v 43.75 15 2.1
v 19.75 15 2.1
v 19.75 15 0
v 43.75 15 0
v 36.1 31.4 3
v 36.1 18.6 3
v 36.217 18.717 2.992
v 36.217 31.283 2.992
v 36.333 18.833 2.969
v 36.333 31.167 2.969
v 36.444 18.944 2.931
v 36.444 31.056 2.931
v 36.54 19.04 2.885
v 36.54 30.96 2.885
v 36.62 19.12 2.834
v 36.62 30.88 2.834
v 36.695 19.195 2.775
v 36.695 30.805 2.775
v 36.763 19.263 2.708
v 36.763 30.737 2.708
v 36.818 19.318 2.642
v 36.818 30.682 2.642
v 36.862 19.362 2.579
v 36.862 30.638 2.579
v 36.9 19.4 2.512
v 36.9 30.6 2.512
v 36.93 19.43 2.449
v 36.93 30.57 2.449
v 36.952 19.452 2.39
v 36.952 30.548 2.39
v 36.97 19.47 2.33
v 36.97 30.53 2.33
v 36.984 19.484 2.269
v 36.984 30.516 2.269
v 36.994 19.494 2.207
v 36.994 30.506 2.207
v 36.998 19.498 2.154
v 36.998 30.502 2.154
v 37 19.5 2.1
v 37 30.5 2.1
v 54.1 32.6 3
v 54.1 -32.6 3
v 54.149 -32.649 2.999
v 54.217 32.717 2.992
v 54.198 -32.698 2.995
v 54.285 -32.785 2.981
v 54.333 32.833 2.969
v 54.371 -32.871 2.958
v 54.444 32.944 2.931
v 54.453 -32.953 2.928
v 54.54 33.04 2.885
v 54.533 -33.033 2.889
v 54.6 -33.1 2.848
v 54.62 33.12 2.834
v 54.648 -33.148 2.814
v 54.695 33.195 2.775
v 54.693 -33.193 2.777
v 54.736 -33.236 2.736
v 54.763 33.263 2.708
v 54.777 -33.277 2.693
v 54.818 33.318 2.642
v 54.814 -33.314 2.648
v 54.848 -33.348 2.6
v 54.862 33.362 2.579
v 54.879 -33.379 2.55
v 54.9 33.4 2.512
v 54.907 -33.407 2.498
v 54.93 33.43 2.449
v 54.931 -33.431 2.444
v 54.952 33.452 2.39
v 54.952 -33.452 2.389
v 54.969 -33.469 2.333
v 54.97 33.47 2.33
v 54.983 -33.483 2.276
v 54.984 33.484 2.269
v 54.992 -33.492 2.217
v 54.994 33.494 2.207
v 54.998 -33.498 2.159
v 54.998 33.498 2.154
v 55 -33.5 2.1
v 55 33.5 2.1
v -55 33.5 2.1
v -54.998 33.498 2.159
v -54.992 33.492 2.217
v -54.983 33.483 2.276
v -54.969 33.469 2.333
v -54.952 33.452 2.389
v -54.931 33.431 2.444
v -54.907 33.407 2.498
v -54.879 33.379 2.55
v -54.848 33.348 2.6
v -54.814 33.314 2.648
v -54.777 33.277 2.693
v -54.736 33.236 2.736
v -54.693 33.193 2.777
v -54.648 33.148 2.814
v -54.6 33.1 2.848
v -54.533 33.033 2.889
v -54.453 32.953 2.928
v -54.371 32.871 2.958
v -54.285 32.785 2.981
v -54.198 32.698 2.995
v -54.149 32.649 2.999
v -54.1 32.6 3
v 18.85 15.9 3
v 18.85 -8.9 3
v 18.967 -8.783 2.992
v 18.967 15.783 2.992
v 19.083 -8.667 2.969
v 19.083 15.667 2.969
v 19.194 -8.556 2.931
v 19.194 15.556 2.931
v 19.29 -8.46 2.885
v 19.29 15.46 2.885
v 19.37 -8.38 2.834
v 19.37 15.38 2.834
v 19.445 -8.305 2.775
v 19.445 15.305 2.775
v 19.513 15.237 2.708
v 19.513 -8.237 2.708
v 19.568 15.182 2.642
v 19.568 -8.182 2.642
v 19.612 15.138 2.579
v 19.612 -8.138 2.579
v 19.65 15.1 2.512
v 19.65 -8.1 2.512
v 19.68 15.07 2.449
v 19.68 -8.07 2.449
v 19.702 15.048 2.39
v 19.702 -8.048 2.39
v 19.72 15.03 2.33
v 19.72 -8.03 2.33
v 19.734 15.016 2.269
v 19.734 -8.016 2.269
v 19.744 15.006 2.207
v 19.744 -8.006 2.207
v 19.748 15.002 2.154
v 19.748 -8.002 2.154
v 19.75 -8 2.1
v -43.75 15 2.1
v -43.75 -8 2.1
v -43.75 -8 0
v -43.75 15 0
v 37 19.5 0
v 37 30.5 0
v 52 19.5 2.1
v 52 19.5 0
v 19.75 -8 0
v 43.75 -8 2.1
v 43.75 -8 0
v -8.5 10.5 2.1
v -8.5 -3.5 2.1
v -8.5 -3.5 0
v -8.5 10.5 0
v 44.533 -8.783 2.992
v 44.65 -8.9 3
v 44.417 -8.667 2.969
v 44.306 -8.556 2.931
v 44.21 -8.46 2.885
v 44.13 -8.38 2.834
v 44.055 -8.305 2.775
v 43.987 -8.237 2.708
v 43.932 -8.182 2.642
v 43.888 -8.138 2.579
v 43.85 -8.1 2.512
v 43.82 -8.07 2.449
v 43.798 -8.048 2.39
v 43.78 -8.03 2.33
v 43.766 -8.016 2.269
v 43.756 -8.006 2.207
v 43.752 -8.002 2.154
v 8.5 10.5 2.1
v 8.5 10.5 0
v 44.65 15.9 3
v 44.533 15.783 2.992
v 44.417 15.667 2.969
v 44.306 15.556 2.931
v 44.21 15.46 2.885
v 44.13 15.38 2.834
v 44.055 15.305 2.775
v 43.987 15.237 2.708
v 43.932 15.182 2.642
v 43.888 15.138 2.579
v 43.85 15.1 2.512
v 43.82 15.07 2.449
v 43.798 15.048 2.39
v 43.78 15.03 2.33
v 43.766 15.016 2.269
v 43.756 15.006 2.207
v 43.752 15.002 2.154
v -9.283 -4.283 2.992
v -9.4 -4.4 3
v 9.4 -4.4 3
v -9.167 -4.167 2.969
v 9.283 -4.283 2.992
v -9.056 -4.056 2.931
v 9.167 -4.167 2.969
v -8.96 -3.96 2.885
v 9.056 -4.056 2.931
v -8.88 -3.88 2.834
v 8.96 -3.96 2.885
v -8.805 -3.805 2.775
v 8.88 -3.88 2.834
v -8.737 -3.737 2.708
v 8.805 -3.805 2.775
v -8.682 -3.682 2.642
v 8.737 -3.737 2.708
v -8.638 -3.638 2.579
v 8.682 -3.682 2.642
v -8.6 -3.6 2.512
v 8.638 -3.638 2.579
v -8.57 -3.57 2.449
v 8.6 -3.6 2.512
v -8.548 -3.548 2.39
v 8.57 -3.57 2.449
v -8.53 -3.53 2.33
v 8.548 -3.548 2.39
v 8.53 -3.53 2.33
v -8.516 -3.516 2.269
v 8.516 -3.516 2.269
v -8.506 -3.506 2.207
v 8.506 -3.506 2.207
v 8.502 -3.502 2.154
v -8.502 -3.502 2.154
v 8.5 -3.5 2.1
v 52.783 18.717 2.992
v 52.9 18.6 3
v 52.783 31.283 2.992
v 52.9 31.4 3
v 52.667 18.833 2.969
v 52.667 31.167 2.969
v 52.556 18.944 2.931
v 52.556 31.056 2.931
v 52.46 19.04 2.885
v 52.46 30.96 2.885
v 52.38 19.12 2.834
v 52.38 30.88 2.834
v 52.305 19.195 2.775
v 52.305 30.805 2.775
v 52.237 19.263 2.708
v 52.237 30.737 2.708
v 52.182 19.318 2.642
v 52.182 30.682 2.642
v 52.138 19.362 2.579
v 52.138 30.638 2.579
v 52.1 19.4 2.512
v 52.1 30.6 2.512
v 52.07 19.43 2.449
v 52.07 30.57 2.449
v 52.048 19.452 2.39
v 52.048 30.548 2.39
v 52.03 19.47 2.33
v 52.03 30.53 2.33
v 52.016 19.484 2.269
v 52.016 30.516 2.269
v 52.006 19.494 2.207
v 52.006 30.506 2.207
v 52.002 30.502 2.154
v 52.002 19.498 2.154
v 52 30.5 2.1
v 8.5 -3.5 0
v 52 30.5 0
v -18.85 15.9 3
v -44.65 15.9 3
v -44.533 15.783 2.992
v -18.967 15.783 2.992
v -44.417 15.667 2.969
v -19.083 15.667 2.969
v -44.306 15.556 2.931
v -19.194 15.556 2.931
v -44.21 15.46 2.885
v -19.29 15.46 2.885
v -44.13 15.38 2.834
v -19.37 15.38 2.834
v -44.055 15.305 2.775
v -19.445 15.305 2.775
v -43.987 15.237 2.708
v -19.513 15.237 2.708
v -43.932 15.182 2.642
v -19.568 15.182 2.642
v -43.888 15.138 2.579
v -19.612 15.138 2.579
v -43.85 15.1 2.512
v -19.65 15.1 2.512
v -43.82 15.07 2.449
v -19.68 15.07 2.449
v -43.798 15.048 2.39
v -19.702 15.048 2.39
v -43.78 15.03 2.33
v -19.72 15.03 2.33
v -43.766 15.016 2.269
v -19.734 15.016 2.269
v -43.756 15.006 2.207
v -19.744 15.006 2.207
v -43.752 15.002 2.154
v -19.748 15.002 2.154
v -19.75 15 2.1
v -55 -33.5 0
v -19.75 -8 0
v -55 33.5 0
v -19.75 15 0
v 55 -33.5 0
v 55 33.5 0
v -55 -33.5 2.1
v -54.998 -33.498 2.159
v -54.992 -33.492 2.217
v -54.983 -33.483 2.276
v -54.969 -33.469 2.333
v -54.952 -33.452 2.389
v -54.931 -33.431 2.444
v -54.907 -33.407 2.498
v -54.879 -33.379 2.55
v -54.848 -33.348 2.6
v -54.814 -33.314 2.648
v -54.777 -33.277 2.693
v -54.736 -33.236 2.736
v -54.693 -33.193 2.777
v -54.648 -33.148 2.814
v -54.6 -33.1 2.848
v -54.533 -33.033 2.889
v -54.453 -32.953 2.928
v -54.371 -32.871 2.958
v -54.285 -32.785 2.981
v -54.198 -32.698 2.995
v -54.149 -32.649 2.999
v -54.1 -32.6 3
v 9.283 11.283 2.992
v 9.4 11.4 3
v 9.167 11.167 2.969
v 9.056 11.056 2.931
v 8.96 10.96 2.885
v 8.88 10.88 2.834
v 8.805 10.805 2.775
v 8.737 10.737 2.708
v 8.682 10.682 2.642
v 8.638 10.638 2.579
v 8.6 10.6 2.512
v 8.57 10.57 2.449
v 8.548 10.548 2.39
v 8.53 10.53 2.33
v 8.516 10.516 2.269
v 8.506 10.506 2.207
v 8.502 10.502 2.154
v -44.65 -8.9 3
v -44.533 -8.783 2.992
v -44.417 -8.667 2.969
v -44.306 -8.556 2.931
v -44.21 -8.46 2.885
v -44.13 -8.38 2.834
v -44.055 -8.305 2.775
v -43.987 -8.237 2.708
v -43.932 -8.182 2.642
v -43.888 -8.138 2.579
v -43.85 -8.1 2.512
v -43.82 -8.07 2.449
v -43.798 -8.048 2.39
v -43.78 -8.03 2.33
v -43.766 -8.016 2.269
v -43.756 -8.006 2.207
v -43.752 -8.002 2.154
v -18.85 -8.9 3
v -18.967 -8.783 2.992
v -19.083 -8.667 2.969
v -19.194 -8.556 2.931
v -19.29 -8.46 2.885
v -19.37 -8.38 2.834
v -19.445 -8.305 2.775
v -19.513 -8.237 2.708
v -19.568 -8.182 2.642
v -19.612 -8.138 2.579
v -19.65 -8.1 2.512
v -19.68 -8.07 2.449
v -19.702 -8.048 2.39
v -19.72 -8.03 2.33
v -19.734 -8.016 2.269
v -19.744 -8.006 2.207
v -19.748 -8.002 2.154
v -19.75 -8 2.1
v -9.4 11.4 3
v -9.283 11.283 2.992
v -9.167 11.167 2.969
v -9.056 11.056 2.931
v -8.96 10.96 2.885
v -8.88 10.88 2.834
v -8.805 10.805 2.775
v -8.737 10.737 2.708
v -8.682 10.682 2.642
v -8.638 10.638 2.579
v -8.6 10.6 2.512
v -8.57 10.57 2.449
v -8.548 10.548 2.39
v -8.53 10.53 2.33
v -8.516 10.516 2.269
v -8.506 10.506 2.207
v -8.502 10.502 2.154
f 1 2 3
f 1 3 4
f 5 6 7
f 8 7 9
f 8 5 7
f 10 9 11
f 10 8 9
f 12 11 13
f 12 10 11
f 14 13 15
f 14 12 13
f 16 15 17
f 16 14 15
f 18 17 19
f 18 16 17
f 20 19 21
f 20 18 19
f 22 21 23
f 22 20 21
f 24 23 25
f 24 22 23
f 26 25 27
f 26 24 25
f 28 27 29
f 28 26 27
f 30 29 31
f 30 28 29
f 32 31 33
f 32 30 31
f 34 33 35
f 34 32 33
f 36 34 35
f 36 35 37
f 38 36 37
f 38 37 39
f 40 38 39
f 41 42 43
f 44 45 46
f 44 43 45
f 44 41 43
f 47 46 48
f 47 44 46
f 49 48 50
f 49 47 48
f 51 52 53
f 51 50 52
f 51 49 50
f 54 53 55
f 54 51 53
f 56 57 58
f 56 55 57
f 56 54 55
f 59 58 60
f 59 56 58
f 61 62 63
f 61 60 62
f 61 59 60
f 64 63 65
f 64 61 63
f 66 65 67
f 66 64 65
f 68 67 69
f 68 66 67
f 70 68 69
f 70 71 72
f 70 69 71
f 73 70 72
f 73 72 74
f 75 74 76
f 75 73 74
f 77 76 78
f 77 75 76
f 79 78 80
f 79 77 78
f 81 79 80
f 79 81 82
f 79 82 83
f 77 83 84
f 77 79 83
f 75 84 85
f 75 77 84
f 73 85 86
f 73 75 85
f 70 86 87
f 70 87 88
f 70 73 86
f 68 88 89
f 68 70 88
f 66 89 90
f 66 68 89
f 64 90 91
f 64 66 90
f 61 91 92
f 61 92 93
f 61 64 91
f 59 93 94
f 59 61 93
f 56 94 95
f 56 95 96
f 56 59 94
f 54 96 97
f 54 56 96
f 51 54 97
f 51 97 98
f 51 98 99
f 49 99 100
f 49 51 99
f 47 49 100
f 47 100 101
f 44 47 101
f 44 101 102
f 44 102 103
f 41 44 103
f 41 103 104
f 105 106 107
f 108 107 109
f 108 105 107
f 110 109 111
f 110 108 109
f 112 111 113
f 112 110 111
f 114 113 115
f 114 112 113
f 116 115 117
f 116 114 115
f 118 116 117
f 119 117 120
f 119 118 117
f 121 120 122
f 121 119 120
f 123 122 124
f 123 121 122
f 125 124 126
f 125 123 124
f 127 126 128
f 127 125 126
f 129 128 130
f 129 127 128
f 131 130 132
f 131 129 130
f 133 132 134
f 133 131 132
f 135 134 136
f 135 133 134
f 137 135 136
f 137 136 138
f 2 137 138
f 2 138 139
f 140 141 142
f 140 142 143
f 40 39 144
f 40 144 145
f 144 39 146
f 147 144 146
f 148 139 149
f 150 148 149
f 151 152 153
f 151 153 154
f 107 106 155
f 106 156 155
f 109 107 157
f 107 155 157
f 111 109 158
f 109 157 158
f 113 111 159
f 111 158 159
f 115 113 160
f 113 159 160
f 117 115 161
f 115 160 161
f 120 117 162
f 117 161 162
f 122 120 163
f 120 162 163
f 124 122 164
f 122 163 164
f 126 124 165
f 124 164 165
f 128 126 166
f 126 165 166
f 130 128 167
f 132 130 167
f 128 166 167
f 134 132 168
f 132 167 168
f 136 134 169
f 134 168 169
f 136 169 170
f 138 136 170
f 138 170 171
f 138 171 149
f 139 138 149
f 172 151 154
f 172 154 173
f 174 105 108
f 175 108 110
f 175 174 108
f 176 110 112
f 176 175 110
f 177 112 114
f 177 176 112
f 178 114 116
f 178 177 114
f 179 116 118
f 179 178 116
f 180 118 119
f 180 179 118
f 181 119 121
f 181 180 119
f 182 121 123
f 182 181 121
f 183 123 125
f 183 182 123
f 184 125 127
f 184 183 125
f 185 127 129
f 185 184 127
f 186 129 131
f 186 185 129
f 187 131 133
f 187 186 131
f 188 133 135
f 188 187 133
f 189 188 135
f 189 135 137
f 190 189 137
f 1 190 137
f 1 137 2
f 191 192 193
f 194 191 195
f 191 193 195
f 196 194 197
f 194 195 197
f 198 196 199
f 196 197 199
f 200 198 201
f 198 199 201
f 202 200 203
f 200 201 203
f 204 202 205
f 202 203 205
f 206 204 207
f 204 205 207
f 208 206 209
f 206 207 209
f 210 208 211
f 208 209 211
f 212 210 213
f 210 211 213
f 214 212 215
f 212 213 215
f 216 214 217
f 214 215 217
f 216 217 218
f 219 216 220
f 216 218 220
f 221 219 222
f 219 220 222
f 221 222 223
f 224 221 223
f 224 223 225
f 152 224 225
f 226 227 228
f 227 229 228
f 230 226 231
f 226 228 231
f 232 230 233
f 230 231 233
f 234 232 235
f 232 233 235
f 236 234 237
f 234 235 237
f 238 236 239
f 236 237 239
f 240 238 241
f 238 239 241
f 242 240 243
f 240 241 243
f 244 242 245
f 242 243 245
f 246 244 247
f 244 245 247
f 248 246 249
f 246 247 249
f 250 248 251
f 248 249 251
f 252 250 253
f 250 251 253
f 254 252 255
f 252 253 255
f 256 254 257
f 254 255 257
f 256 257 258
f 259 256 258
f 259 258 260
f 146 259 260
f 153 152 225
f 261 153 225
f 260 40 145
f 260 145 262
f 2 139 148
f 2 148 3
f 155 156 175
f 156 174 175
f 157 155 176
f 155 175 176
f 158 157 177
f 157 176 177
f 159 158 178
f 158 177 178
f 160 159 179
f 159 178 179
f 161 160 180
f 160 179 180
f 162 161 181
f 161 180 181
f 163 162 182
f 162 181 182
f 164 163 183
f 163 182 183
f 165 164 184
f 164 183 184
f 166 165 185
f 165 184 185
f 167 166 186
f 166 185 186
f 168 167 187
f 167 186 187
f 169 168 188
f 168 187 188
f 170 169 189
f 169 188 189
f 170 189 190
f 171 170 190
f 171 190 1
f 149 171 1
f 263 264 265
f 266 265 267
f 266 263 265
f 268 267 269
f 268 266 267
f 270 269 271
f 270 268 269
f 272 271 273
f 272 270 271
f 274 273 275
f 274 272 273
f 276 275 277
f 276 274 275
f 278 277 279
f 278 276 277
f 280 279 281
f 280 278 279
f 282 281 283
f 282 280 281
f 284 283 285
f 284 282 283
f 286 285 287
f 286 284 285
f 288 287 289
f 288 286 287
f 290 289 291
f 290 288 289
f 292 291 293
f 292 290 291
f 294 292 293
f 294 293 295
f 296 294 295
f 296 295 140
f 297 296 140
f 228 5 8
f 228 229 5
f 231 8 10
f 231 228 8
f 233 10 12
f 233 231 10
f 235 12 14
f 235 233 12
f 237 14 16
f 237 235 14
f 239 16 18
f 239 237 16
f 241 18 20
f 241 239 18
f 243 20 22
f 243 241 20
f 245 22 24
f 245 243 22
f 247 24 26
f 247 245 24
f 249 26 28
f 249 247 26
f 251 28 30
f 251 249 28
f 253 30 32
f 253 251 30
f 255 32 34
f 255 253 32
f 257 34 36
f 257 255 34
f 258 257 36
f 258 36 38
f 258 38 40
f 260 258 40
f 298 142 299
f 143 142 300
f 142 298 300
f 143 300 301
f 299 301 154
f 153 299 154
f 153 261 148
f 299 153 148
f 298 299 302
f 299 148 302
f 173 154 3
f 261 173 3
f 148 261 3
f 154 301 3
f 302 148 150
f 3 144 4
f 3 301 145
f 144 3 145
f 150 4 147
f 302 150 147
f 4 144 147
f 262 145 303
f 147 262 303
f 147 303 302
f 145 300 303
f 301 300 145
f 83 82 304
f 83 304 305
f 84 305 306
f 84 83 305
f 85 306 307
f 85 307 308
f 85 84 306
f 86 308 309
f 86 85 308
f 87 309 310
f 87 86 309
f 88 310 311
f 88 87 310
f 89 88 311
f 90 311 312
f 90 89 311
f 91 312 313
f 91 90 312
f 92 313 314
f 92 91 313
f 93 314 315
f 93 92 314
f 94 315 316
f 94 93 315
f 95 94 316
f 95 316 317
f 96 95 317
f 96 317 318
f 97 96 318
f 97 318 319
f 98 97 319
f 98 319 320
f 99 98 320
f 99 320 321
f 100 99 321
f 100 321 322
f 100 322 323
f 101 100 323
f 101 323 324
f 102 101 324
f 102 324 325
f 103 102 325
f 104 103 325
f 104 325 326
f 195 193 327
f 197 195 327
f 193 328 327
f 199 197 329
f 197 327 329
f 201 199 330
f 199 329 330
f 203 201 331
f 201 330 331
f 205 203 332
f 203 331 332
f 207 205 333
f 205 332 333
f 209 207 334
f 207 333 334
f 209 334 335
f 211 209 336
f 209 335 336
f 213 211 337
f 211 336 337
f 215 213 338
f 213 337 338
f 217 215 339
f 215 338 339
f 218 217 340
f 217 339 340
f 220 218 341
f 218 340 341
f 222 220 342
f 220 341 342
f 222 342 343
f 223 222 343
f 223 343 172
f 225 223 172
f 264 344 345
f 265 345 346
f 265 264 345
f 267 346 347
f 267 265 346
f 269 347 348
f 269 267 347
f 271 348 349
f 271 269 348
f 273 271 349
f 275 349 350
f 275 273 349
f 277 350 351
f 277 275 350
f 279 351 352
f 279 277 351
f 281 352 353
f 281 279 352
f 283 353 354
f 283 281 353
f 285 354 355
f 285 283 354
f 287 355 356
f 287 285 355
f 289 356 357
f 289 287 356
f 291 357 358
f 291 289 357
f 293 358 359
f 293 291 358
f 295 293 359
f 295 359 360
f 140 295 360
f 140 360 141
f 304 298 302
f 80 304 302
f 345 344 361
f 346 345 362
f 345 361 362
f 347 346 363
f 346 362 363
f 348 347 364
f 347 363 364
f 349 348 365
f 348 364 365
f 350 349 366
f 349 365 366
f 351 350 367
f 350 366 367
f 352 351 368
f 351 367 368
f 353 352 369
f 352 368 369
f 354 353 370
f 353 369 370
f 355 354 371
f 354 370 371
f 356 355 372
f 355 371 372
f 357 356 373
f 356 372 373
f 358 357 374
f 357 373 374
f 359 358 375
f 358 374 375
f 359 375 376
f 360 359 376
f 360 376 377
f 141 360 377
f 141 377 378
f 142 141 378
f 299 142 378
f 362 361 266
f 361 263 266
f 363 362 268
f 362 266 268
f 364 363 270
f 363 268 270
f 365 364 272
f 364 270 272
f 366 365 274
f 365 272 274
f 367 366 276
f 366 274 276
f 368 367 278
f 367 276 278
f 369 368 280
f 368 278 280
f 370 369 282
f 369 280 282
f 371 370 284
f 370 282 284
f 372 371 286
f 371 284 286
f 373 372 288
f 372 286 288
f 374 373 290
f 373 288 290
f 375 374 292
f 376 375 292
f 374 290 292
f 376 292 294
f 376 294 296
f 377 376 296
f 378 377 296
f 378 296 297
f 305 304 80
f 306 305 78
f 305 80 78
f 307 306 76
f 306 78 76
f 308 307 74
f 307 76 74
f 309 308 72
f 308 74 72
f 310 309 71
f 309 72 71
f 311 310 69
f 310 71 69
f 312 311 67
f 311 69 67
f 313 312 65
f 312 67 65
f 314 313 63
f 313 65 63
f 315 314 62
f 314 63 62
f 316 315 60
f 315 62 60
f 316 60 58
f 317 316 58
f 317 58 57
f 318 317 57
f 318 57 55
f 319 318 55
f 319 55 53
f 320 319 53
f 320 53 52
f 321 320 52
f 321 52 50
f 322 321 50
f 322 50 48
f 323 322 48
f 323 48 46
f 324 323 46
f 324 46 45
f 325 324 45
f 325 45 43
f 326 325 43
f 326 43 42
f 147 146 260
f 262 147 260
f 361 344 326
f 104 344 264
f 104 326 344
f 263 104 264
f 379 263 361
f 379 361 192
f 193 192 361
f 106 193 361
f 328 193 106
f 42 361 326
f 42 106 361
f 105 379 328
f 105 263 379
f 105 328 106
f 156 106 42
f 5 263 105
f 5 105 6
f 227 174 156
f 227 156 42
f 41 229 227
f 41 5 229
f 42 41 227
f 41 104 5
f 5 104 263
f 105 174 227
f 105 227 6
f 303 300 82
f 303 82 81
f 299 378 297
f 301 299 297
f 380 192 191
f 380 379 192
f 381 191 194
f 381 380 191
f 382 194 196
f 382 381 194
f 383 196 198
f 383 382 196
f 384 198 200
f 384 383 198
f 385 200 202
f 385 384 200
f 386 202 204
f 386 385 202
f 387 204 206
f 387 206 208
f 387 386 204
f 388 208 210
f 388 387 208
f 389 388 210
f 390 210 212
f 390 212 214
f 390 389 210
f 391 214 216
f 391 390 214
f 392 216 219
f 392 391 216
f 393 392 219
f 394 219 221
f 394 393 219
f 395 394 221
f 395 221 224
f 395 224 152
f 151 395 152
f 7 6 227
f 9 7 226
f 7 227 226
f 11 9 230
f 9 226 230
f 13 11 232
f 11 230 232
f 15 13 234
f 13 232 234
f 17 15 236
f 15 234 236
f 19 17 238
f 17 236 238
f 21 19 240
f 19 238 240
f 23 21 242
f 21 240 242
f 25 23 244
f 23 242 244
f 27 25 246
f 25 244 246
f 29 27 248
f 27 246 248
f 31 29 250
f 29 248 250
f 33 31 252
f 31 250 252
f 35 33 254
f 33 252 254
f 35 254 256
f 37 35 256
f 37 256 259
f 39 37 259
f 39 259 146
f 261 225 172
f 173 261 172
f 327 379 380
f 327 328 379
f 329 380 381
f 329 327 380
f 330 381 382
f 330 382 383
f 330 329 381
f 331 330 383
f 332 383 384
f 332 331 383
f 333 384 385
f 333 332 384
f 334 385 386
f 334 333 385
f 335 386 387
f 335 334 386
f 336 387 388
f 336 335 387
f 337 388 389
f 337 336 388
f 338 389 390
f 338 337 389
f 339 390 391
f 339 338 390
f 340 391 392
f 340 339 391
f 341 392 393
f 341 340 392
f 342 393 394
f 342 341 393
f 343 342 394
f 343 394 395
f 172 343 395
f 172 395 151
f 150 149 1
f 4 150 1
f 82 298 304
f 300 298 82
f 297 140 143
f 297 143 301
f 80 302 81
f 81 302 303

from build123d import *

# Parameters (mm, degrees)
SKETCH1_W           = 110
SKETCH1_H           = 67
BOSS_EXTRUDE1_DEPTH = 3
CUT_EXTRUDE1_REACH  = 66.469
SKETCH2_W           = 24
SKETCH2_H           = 23
SKETCH2_W_2         = 17
SKETCH2_H_2         = 14
SKETCH2_W_3         = 15
SKETCH2_H_3         = 11
FILLET1_R           = 0.9


with BuildPart() as part:
    # Sketch1 → Boss-Extrude1 (new body)
    with BuildSketch(Plane.XY):
        Rectangle(SKETCH1_W, SKETCH1_H)
    extrude(amount=BOSS_EXTRUDE1_DEPTH)

    # Sketch2 → Cut-Extrude1 (cut, up to next)
    with BuildSketch(Plane.XY.offset(3), mode=Mode.PRIVATE) as cut_extrude1_sk1:
        with Locations((-31.75, 3.5)):
            Rectangle(SKETCH2_W, SKETCH2_H)
    cut_extrude1_tool1 = extrude(cut_extrude1_sk1.sketch, amount=-CUT_EXTRUDE1_REACH, mode=Mode.PRIVATE) & part.part
    # Sketch2 → Cut-Extrude1 (cut, up to next)
    with BuildSketch(Plane.XY.offset(3), mode=Mode.PRIVATE) as cut_extrude1_sk2:
        with Locations((0, 3.5)):
            Rectangle(SKETCH2_W_2, SKETCH2_H_2)
    cut_extrude1_tool2 = extrude(cut_extrude1_sk2.sketch, amount=-CUT_EXTRUDE1_REACH, mode=Mode.PRIVATE) & part.part
    # Sketch2 → Cut-Extrude1 (cut, up to next)
    with BuildSketch(Plane.XY.offset(3), mode=Mode.PRIVATE) as cut_extrude1_sk3:
        with Locations((31.75, 3.5)):
            Rectangle(SKETCH2_W, SKETCH2_H)
    cut_extrude1_tool3 = extrude(cut_extrude1_sk3.sketch, amount=-CUT_EXTRUDE1_REACH, mode=Mode.PRIVATE) & part.part
    # Sketch2 → Cut-Extrude1 (cut, up to next)
    with BuildSketch(Plane.XY.offset(3), mode=Mode.PRIVATE) as cut_extrude1_sk4:
        with Locations((44.5, 25)):
            Rectangle(SKETCH2_W_3, SKETCH2_H_3)
    cut_extrude1_tool4 = extrude(cut_extrude1_sk4.sketch, amount=-CUT_EXTRUDE1_REACH, mode=Mode.PRIVATE) & part.part
    add(cut_extrude1_tool1.solids().sort_by_distance((-31.75, 3.5, 3))[0], mode=Mode.SUBTRACT)
    add(cut_extrude1_tool2.solids().sort_by_distance((0, 3.5, 3))[0], mode=Mode.SUBTRACT)
    add(cut_extrude1_tool3.solids().sort_by_distance((31.75, 3.5, 3))[0], mode=Mode.SUBTRACT)
    add(cut_extrude1_tool4.solids().sort_by_distance((44.5, 25, 3))[0], mode=Mode.SUBTRACT)

    # Fillet1
    fillet1_edges = [part.edges().sort_by_distance(p)[0] for p in [
        (-55, 0, 3),
        (0, -33.5, 3),
        (-19.75, 3.5, 3),
        (-31.75, 15, 3),
        (-43.75, 3.5, 3),
        (-31.75, -8, 3),
        (8.5, 3.5, 3),
        (0, 10.5, 3),
        (-8.5, 3.5, 3),
        (0, -3.5, 3),
        (43.75, 3.5, 3),
        (31.75, 15, 3),
        (19.75, 3.5, 3),
        (31.75, -8, 3),
        (52, 25, 3),
        (44.5, 30.5, 3),
        (37, 25, 3),
        (44.5, 19.5, 3),
        (55, 0, 3),
        (0, 33.5, 3),
    ]]
    fillet(fillet1_edges, radius=FILLET1_R)


solid = part.part
